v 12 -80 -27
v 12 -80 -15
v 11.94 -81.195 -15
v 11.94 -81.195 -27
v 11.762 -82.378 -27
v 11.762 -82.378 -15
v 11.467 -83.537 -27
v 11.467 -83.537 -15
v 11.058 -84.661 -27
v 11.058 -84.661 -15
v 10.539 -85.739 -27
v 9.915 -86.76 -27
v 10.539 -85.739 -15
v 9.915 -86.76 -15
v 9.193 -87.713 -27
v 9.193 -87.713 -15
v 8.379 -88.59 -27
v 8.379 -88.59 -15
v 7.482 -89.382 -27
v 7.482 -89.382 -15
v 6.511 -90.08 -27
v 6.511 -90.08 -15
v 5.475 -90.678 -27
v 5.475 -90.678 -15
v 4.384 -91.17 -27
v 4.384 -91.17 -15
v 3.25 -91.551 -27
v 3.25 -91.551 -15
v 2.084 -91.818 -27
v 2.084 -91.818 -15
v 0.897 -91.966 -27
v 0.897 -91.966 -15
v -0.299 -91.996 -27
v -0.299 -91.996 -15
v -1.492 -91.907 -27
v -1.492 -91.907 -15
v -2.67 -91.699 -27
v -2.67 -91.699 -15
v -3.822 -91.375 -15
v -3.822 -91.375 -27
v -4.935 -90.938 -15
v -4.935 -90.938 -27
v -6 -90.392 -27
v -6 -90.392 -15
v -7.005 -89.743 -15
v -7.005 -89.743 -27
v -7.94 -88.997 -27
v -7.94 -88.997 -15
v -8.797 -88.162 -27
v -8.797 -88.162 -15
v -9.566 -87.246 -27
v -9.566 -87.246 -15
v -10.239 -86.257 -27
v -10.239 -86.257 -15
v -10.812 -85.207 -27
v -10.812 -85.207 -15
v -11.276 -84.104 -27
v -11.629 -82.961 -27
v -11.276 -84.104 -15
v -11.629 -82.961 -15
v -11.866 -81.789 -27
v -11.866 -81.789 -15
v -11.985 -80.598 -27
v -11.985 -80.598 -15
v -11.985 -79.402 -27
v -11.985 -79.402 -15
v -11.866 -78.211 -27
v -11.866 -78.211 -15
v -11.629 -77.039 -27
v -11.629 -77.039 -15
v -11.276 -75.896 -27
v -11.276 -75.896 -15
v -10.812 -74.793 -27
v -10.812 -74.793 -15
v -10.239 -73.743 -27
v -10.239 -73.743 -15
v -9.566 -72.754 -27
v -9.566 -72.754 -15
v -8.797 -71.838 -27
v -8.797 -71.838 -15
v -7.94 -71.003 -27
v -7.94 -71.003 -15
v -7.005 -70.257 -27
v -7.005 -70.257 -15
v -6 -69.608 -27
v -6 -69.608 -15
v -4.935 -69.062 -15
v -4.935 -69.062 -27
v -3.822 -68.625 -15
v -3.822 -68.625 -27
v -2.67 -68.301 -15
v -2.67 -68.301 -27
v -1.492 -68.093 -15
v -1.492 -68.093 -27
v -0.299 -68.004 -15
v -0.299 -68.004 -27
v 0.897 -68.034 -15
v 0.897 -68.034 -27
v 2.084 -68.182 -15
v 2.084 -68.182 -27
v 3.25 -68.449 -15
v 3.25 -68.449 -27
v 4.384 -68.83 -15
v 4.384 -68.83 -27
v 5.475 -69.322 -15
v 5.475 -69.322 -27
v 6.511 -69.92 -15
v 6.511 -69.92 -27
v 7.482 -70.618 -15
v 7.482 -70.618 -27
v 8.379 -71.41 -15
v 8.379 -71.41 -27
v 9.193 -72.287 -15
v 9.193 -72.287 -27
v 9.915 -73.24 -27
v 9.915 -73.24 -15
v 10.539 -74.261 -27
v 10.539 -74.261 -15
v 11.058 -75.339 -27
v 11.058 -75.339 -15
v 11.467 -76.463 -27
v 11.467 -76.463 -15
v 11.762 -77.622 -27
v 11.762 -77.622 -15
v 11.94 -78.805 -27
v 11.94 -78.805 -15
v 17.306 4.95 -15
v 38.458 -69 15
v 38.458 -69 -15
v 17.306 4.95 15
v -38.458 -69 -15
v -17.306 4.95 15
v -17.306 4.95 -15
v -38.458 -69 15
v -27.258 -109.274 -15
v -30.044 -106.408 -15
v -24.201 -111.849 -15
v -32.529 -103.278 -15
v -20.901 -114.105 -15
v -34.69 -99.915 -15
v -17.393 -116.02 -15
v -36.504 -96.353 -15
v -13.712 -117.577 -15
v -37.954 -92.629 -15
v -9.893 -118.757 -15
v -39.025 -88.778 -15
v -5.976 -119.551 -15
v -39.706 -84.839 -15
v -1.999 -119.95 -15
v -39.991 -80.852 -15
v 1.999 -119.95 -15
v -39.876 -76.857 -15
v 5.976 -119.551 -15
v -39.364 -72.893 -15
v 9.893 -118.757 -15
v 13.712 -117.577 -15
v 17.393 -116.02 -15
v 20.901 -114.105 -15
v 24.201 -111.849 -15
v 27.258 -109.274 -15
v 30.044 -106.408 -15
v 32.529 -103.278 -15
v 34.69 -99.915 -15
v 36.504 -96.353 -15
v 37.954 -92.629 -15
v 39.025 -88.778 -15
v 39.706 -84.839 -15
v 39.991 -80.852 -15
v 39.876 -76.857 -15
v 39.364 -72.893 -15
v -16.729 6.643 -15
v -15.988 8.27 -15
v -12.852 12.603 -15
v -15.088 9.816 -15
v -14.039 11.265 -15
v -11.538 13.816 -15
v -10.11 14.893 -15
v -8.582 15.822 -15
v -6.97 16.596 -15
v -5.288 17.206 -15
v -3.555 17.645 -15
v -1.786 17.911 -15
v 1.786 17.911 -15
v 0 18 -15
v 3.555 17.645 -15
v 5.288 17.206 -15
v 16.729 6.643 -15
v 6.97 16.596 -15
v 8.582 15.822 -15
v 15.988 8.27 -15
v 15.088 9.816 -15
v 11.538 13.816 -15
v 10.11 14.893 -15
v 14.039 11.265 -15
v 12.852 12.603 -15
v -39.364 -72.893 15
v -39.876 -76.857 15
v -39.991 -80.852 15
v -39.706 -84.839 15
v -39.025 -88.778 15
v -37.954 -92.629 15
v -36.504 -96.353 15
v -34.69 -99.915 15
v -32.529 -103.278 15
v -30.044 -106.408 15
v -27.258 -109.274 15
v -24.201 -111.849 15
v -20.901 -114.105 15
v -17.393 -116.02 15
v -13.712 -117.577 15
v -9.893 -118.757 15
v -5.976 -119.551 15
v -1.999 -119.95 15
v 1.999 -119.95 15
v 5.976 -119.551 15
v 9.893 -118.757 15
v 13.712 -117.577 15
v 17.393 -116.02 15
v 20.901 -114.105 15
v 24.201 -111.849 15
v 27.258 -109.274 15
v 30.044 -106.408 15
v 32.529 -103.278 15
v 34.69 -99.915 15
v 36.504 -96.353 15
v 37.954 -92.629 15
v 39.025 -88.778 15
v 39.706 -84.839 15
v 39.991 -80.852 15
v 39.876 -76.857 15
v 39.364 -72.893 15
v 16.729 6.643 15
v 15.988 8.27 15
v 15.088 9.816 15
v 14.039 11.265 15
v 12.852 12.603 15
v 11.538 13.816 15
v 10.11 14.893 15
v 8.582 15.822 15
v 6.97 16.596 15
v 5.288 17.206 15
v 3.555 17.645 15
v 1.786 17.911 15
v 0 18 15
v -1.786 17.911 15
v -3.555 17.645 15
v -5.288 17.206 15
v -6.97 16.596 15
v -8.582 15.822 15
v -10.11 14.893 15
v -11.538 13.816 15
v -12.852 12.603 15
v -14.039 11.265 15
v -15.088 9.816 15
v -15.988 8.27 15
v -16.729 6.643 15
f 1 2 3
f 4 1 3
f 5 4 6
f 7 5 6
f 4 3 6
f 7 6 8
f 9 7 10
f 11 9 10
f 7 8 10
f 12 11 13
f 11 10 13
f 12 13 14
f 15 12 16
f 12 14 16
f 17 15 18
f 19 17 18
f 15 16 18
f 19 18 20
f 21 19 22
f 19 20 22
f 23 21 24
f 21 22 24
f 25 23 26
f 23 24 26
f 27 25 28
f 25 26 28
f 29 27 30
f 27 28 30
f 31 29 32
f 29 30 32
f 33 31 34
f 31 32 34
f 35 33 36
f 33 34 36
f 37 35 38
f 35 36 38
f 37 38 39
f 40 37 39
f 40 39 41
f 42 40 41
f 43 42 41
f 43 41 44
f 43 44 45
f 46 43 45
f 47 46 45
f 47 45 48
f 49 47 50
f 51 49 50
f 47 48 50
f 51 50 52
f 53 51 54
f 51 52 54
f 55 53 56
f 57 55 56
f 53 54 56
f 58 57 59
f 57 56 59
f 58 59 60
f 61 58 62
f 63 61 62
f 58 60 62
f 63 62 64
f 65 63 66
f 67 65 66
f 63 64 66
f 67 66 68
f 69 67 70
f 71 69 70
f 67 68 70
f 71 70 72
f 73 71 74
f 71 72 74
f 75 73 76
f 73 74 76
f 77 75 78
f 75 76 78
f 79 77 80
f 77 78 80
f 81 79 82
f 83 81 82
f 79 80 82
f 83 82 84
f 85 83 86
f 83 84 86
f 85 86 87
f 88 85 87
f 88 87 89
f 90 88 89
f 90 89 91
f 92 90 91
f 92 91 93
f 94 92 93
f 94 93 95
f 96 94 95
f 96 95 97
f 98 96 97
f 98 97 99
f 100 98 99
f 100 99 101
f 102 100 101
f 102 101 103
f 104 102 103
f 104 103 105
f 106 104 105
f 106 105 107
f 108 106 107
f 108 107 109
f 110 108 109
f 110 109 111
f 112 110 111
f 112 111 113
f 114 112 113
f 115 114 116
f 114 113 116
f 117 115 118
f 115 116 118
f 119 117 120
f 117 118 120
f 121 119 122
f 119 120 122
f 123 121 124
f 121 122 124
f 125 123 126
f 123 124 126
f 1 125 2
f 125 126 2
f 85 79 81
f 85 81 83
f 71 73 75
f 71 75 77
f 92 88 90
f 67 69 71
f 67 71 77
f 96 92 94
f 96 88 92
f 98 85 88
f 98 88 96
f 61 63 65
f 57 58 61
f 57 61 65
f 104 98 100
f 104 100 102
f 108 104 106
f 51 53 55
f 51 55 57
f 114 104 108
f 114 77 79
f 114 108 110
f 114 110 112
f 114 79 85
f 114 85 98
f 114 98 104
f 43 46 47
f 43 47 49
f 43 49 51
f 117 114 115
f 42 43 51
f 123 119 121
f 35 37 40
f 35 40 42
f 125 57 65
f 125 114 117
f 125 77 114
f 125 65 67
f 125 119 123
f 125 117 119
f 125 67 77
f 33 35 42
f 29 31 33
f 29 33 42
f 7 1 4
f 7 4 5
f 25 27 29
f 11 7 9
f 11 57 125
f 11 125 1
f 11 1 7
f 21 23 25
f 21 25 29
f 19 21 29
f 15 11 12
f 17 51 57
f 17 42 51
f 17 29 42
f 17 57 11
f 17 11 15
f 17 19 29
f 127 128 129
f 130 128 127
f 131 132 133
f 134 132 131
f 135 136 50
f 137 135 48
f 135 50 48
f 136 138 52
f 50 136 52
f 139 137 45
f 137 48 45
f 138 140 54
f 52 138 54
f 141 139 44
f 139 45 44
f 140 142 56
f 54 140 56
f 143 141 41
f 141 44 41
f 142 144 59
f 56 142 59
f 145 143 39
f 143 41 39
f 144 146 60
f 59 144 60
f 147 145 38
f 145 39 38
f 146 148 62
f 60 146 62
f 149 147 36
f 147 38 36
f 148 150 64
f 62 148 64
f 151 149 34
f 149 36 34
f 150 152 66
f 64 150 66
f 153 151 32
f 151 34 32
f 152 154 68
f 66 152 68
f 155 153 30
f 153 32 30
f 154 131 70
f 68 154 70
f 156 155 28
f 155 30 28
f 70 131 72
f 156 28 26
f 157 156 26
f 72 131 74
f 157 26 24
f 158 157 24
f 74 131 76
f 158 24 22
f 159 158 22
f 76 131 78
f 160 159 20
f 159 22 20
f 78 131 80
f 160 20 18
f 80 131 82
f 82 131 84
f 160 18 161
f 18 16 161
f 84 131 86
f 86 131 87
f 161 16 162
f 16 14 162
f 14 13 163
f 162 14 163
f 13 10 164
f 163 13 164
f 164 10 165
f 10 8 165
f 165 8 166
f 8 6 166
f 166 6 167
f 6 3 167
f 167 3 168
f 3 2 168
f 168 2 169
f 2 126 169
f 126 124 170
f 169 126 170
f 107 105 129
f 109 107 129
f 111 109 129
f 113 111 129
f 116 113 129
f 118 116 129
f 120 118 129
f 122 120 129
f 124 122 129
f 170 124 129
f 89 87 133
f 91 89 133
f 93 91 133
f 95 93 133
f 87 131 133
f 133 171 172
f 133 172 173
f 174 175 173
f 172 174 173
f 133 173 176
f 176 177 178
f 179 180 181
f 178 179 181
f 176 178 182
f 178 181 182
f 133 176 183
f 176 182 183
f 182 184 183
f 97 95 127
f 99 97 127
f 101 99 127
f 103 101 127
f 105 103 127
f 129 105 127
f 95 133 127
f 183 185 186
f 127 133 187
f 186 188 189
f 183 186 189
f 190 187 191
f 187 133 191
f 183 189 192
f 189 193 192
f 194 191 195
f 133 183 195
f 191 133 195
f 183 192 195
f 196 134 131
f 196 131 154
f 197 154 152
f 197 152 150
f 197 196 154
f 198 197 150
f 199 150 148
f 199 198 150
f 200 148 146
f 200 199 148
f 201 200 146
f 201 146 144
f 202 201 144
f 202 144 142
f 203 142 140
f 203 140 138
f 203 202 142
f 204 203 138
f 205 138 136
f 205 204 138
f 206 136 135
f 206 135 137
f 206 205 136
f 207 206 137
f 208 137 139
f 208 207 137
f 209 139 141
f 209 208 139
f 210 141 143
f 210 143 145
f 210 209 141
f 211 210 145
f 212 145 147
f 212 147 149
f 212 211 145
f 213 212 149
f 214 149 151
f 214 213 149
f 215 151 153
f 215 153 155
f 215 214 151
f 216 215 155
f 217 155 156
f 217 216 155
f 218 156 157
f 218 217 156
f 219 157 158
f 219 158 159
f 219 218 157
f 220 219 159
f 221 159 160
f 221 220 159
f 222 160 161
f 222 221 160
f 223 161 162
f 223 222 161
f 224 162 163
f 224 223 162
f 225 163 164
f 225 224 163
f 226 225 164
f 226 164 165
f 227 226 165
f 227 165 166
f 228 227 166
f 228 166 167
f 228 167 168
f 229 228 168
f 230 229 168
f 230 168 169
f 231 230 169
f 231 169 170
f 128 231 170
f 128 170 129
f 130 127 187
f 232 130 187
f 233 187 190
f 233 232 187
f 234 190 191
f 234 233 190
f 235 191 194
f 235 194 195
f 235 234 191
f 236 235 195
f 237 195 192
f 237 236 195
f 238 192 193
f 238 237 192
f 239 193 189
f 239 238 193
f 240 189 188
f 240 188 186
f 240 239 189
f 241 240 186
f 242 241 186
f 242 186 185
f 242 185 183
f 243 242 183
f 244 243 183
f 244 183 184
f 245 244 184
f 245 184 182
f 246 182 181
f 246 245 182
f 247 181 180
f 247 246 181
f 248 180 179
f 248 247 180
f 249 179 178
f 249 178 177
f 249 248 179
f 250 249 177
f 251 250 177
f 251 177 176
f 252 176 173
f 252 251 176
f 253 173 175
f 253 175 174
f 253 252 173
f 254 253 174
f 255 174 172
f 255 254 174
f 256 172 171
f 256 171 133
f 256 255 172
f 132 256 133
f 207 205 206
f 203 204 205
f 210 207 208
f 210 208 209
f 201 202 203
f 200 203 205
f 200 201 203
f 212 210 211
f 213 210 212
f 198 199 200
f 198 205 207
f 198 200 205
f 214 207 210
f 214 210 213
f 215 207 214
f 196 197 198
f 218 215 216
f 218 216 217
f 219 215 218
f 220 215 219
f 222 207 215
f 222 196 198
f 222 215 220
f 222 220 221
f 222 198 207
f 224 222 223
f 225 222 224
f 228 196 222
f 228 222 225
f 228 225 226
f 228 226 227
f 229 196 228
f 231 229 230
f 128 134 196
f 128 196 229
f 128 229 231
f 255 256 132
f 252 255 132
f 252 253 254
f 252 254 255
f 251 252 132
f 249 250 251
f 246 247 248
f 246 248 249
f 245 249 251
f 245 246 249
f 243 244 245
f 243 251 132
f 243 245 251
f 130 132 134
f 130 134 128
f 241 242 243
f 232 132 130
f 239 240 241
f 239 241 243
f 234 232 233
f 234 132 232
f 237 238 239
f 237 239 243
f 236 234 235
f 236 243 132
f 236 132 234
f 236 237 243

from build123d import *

# Parameters (mm, degrees)
SALIENTE_EXTRUIR2_DEPTH = 15
CROQUIS2_R              = 12
SALIENTE_EXTRUIR3_DEPTH = 12


with BuildPart() as part:
    # Croquis1 → Saliente-Extruir2 (new, symmetric)
    with BuildSketch(Plane.XY):
        with BuildLine():
            Line((-17.305996071, 4.95), (-38.457769046, -69))
            ThreePointArc((-38.457769046, -69), (0, -120), (38.457769046, -69))
            Line((38.457769046, -69), (17.305996071, 4.95))
            ThreePointArc((17.305996071, 4.95), (0, 18), (-17.305996071, 4.95))
        make_face()
    extrude(amount=SALIENTE_EXTRUIR2_DEPTH, both=True)

    # Croquis2 → Saliente-Extruir3 (add)
    with BuildSketch(Plane(origin=(0, 0, -15), x_dir=(-1, 0, 0), z_dir=(0, 0, -1))):
        with Locations(Location((0, -80, 0), (0, 0, 180))):
            Circle(CROQUIS2_R)
    extrude(amount=SALIENTE_EXTRUIR3_DEPTH)


solid = part.part
